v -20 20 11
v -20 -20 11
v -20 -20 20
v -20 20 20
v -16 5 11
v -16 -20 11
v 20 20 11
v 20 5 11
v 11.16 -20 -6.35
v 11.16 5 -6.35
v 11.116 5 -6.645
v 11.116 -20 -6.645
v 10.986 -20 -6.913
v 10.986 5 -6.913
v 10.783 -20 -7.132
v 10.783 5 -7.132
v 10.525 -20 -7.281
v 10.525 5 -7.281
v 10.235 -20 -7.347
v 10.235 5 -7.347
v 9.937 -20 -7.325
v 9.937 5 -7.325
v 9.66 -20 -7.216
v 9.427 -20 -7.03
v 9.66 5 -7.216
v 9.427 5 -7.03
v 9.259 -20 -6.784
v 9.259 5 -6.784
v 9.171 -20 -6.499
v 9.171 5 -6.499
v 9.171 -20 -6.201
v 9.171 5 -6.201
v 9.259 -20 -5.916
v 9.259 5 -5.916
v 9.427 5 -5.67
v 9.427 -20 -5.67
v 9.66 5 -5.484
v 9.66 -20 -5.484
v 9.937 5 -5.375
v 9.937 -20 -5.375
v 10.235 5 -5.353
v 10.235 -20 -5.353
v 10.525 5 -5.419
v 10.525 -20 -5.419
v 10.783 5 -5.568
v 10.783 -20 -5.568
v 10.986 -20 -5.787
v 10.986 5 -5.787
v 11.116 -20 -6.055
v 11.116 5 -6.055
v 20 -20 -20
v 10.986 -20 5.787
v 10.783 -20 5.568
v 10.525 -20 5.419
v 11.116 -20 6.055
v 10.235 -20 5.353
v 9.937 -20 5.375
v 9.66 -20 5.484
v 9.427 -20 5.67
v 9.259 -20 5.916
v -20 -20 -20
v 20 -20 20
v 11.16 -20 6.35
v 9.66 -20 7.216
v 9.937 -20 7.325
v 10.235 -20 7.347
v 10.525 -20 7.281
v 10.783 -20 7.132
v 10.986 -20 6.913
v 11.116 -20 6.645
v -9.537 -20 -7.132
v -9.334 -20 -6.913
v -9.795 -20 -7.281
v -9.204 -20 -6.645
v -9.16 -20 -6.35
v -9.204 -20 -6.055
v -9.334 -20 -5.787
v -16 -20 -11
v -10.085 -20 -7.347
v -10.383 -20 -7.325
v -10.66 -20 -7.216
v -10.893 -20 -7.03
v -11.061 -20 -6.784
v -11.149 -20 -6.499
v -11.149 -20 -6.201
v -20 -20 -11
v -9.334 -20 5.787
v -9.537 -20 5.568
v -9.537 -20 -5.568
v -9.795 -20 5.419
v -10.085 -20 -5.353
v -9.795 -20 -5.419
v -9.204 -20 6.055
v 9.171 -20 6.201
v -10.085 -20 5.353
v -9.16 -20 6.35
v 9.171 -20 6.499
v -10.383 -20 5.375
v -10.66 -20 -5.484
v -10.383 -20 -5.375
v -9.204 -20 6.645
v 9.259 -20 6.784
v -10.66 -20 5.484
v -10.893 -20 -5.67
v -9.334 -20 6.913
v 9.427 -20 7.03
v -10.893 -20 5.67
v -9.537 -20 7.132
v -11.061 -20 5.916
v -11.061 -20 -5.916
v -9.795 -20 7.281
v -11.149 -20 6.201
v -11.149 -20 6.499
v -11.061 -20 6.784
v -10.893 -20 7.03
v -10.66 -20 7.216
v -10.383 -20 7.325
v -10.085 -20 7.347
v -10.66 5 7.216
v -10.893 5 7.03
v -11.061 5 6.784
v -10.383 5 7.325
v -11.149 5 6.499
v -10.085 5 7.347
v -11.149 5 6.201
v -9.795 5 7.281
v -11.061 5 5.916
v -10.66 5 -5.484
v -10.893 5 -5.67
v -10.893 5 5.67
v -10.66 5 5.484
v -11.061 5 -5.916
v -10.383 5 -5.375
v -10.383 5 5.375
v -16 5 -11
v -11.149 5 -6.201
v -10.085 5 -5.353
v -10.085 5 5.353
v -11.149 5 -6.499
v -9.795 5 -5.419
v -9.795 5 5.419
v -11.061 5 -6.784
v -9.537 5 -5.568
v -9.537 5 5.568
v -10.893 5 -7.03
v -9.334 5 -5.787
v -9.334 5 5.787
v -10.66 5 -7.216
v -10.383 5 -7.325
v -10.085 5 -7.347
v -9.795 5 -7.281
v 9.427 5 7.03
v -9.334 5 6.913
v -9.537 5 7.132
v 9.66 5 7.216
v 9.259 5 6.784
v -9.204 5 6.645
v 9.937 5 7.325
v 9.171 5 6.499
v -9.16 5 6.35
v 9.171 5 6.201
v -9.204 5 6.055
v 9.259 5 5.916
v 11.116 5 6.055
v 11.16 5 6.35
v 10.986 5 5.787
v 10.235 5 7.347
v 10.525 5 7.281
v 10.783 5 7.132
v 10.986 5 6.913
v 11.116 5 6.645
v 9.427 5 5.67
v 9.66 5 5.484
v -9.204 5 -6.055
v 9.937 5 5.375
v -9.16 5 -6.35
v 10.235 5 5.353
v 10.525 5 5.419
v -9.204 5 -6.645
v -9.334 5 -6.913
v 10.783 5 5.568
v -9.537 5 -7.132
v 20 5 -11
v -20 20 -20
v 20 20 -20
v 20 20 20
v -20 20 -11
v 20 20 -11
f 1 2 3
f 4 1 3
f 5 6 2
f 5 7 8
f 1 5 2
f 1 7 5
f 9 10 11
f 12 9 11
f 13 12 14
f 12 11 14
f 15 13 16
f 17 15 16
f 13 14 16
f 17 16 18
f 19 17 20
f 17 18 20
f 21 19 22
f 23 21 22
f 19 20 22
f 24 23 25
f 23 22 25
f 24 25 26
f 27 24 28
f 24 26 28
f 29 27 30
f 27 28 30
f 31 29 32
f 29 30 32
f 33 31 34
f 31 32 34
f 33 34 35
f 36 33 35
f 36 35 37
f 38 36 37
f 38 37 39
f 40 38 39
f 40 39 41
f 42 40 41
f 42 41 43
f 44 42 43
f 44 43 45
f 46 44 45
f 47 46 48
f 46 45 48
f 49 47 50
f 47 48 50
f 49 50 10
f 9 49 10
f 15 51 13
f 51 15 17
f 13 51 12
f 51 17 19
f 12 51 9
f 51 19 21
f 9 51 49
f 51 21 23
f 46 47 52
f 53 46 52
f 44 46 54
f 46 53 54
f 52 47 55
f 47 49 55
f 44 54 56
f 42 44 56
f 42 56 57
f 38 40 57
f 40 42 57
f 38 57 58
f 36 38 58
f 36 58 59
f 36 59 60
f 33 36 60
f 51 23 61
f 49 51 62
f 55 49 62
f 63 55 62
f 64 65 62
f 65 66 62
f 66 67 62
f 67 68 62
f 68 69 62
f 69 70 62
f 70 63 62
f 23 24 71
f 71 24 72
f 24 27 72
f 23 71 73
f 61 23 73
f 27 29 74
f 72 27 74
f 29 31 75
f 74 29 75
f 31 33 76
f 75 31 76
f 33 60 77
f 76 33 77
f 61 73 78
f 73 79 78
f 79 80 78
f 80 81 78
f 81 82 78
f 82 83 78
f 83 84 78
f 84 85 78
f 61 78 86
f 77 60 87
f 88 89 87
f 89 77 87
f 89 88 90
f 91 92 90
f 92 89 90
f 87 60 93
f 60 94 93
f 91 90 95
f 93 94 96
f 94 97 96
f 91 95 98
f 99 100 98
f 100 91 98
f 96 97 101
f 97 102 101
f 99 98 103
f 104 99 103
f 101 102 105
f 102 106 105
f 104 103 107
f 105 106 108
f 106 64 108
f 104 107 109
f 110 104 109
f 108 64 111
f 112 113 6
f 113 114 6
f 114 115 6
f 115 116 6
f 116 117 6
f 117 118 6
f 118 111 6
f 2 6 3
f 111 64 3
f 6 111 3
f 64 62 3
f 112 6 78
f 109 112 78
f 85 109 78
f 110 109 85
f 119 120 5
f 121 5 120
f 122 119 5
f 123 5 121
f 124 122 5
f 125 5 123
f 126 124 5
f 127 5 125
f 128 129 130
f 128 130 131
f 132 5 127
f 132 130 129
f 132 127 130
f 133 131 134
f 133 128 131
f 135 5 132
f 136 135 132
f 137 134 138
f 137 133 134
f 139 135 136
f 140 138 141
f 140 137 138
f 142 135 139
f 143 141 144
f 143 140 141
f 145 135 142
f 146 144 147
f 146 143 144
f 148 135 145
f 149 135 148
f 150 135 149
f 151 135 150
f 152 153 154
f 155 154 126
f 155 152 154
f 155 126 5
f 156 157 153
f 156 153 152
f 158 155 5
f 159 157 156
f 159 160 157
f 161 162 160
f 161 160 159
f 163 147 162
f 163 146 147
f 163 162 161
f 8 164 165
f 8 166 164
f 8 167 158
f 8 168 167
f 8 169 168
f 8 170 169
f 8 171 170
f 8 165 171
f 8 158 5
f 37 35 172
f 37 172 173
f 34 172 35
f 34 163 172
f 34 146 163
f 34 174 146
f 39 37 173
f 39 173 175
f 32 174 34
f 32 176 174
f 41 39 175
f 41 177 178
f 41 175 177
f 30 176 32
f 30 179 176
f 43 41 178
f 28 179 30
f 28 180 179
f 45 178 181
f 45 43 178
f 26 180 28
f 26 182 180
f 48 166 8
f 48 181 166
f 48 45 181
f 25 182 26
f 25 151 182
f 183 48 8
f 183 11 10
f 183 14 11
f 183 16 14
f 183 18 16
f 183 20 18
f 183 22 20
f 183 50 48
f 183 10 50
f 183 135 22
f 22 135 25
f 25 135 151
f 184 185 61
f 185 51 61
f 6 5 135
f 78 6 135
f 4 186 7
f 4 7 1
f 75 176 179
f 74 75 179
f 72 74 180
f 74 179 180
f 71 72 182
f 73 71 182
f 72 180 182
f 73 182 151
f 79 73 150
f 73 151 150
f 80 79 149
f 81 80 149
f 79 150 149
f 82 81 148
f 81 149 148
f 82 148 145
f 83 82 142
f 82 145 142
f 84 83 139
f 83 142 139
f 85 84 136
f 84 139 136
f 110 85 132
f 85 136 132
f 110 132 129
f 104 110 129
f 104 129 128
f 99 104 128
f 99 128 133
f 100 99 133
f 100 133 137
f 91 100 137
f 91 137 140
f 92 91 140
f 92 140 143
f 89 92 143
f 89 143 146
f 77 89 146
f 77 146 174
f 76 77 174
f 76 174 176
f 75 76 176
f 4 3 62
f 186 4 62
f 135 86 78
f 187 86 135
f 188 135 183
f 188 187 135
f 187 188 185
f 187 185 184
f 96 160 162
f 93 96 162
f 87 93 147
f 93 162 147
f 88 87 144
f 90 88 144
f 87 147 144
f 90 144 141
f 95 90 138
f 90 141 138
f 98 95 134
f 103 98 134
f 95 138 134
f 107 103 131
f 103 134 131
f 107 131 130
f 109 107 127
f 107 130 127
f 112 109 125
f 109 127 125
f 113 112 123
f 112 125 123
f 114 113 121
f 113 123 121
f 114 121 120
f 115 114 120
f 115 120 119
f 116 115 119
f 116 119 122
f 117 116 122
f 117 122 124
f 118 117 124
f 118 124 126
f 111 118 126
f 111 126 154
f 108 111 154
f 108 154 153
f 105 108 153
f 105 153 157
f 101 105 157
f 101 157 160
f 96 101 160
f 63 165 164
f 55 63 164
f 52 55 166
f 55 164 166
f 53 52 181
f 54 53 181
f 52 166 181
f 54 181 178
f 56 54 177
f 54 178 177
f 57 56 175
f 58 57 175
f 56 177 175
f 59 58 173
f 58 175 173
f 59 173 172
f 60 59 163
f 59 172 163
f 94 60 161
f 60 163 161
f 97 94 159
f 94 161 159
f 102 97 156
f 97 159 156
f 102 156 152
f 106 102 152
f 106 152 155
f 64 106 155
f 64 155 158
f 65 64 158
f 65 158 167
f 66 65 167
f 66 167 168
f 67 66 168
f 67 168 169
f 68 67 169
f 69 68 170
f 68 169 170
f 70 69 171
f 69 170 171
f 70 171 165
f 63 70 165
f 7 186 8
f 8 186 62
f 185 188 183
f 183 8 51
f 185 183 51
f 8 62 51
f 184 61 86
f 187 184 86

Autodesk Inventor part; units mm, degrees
ref_plane "YZ Plane" through (0, 0, 0) normal (1, 0, 0) x (0, 1, 0)
ref_plane "XZ Plane" through (0, 0, 0) normal (0, 1, 0) x (-1, 0, 0)
ref_plane "XY Plane" through (0, 0, 0) normal (0, 0, 1) x (1, 0, 0)
sketch "Sketch1" plane through (0, 0, 0) normal (0, 1, 0) x (-1, 0, 0)
  line L0 (-20, -20) -> (20, -20)
  line L1 (20, -20) -> (20, 20)
  line L2 (20, 20) -> (-20, 20)
  line L3 (-20, 20) -> (-20, -20)
  line L4 (-20, -20) -> (20, 20) construction
  line L5 (20, -20) -> (-20, 20) construction
  point P0 (0, 0)
  dimension "d0" = 40
extrude "Extrusion1" add sketch "Sketch1" along normal mid plane 40
sketch "Sketch2" plane through (0, 20, 0) normal (0, 1, 0) x (1, 0, 0)
  line L0 (-20, 20) -> (-20, -20) projected
  line L1 (20, -11) -> (-20, -11)
  line L2 (-20, -11) -> (-20, 11)
  line L3 (-20, 11) -> (20, 11)
  line L4 (20, 11) -> (20, -11)
  line L5 (20, -11) -> (-20, 11) construction
  line L6 (-20, -11) -> (20, 11) construction
  line L7 (-24, -11) -> (-16, -11)
  line L8 (-16, -11) -> (-16, 11)
  line L9 (-16, 11) -> (-24, 11)
  line L10 (-24, 11) -> (-24, -11)
  line L11 (-24, -11) -> (-16, 11) construction
  line L12 (-16, -11) -> (-24, 11) construction
  line L13 (-10.16, 6.35) -> (10.16, 6.35) construction
  line L14 (10.16, 6.35) -> (10.16, -6.35) construction
  line L15 (10.16, -6.35) -> (-10.16, -6.35) construction
  line L16 (-10.16, -6.35) -> (-10.16, 6.35) construction
  line L17 (-10.16, 6.35) -> (10.16, -6.35) construction
  line L18 (10.16, 6.35) -> (-10.16, -6.35) construction
  circle A0 centre (10.16, -6.35) radius 1
  circle A1 centre (-10.16, -6.35) radius 1
  circle A2 centre (-10.16, 6.35) radius 1
  circle A3 centre (10.16, 6.35) radius 1
  point P0 (0, 0)
  point P1 (-20, -11)
  point P2 (-20, 0)
  point P3 (-20, -11)
  point P4 (-16, -11)
  dimension "d3" = 22
  dimension "d6" = 8
  dimension "d9" = 12.7
  dimension "d10" = 20.32
  dimension "d11" = 2
extrude "Extrusion2" cut sketch "Sketch2" against normal blind 15 contours L3 L8 L1 L0 | L3 L4 L1 L8 | A0 | A1 | A2 | A3
extrude "Extrusion3" cut sketch "Sketch2" against normal through all contours L3 L8 L1 L0 | L0 L7 L10 L9
extrude "Extrusion4" cut sketch "Sketch2" against normal through all contours A0 | A1 | A2 | A3
properties part number "IMU_Calibration_Cube"
